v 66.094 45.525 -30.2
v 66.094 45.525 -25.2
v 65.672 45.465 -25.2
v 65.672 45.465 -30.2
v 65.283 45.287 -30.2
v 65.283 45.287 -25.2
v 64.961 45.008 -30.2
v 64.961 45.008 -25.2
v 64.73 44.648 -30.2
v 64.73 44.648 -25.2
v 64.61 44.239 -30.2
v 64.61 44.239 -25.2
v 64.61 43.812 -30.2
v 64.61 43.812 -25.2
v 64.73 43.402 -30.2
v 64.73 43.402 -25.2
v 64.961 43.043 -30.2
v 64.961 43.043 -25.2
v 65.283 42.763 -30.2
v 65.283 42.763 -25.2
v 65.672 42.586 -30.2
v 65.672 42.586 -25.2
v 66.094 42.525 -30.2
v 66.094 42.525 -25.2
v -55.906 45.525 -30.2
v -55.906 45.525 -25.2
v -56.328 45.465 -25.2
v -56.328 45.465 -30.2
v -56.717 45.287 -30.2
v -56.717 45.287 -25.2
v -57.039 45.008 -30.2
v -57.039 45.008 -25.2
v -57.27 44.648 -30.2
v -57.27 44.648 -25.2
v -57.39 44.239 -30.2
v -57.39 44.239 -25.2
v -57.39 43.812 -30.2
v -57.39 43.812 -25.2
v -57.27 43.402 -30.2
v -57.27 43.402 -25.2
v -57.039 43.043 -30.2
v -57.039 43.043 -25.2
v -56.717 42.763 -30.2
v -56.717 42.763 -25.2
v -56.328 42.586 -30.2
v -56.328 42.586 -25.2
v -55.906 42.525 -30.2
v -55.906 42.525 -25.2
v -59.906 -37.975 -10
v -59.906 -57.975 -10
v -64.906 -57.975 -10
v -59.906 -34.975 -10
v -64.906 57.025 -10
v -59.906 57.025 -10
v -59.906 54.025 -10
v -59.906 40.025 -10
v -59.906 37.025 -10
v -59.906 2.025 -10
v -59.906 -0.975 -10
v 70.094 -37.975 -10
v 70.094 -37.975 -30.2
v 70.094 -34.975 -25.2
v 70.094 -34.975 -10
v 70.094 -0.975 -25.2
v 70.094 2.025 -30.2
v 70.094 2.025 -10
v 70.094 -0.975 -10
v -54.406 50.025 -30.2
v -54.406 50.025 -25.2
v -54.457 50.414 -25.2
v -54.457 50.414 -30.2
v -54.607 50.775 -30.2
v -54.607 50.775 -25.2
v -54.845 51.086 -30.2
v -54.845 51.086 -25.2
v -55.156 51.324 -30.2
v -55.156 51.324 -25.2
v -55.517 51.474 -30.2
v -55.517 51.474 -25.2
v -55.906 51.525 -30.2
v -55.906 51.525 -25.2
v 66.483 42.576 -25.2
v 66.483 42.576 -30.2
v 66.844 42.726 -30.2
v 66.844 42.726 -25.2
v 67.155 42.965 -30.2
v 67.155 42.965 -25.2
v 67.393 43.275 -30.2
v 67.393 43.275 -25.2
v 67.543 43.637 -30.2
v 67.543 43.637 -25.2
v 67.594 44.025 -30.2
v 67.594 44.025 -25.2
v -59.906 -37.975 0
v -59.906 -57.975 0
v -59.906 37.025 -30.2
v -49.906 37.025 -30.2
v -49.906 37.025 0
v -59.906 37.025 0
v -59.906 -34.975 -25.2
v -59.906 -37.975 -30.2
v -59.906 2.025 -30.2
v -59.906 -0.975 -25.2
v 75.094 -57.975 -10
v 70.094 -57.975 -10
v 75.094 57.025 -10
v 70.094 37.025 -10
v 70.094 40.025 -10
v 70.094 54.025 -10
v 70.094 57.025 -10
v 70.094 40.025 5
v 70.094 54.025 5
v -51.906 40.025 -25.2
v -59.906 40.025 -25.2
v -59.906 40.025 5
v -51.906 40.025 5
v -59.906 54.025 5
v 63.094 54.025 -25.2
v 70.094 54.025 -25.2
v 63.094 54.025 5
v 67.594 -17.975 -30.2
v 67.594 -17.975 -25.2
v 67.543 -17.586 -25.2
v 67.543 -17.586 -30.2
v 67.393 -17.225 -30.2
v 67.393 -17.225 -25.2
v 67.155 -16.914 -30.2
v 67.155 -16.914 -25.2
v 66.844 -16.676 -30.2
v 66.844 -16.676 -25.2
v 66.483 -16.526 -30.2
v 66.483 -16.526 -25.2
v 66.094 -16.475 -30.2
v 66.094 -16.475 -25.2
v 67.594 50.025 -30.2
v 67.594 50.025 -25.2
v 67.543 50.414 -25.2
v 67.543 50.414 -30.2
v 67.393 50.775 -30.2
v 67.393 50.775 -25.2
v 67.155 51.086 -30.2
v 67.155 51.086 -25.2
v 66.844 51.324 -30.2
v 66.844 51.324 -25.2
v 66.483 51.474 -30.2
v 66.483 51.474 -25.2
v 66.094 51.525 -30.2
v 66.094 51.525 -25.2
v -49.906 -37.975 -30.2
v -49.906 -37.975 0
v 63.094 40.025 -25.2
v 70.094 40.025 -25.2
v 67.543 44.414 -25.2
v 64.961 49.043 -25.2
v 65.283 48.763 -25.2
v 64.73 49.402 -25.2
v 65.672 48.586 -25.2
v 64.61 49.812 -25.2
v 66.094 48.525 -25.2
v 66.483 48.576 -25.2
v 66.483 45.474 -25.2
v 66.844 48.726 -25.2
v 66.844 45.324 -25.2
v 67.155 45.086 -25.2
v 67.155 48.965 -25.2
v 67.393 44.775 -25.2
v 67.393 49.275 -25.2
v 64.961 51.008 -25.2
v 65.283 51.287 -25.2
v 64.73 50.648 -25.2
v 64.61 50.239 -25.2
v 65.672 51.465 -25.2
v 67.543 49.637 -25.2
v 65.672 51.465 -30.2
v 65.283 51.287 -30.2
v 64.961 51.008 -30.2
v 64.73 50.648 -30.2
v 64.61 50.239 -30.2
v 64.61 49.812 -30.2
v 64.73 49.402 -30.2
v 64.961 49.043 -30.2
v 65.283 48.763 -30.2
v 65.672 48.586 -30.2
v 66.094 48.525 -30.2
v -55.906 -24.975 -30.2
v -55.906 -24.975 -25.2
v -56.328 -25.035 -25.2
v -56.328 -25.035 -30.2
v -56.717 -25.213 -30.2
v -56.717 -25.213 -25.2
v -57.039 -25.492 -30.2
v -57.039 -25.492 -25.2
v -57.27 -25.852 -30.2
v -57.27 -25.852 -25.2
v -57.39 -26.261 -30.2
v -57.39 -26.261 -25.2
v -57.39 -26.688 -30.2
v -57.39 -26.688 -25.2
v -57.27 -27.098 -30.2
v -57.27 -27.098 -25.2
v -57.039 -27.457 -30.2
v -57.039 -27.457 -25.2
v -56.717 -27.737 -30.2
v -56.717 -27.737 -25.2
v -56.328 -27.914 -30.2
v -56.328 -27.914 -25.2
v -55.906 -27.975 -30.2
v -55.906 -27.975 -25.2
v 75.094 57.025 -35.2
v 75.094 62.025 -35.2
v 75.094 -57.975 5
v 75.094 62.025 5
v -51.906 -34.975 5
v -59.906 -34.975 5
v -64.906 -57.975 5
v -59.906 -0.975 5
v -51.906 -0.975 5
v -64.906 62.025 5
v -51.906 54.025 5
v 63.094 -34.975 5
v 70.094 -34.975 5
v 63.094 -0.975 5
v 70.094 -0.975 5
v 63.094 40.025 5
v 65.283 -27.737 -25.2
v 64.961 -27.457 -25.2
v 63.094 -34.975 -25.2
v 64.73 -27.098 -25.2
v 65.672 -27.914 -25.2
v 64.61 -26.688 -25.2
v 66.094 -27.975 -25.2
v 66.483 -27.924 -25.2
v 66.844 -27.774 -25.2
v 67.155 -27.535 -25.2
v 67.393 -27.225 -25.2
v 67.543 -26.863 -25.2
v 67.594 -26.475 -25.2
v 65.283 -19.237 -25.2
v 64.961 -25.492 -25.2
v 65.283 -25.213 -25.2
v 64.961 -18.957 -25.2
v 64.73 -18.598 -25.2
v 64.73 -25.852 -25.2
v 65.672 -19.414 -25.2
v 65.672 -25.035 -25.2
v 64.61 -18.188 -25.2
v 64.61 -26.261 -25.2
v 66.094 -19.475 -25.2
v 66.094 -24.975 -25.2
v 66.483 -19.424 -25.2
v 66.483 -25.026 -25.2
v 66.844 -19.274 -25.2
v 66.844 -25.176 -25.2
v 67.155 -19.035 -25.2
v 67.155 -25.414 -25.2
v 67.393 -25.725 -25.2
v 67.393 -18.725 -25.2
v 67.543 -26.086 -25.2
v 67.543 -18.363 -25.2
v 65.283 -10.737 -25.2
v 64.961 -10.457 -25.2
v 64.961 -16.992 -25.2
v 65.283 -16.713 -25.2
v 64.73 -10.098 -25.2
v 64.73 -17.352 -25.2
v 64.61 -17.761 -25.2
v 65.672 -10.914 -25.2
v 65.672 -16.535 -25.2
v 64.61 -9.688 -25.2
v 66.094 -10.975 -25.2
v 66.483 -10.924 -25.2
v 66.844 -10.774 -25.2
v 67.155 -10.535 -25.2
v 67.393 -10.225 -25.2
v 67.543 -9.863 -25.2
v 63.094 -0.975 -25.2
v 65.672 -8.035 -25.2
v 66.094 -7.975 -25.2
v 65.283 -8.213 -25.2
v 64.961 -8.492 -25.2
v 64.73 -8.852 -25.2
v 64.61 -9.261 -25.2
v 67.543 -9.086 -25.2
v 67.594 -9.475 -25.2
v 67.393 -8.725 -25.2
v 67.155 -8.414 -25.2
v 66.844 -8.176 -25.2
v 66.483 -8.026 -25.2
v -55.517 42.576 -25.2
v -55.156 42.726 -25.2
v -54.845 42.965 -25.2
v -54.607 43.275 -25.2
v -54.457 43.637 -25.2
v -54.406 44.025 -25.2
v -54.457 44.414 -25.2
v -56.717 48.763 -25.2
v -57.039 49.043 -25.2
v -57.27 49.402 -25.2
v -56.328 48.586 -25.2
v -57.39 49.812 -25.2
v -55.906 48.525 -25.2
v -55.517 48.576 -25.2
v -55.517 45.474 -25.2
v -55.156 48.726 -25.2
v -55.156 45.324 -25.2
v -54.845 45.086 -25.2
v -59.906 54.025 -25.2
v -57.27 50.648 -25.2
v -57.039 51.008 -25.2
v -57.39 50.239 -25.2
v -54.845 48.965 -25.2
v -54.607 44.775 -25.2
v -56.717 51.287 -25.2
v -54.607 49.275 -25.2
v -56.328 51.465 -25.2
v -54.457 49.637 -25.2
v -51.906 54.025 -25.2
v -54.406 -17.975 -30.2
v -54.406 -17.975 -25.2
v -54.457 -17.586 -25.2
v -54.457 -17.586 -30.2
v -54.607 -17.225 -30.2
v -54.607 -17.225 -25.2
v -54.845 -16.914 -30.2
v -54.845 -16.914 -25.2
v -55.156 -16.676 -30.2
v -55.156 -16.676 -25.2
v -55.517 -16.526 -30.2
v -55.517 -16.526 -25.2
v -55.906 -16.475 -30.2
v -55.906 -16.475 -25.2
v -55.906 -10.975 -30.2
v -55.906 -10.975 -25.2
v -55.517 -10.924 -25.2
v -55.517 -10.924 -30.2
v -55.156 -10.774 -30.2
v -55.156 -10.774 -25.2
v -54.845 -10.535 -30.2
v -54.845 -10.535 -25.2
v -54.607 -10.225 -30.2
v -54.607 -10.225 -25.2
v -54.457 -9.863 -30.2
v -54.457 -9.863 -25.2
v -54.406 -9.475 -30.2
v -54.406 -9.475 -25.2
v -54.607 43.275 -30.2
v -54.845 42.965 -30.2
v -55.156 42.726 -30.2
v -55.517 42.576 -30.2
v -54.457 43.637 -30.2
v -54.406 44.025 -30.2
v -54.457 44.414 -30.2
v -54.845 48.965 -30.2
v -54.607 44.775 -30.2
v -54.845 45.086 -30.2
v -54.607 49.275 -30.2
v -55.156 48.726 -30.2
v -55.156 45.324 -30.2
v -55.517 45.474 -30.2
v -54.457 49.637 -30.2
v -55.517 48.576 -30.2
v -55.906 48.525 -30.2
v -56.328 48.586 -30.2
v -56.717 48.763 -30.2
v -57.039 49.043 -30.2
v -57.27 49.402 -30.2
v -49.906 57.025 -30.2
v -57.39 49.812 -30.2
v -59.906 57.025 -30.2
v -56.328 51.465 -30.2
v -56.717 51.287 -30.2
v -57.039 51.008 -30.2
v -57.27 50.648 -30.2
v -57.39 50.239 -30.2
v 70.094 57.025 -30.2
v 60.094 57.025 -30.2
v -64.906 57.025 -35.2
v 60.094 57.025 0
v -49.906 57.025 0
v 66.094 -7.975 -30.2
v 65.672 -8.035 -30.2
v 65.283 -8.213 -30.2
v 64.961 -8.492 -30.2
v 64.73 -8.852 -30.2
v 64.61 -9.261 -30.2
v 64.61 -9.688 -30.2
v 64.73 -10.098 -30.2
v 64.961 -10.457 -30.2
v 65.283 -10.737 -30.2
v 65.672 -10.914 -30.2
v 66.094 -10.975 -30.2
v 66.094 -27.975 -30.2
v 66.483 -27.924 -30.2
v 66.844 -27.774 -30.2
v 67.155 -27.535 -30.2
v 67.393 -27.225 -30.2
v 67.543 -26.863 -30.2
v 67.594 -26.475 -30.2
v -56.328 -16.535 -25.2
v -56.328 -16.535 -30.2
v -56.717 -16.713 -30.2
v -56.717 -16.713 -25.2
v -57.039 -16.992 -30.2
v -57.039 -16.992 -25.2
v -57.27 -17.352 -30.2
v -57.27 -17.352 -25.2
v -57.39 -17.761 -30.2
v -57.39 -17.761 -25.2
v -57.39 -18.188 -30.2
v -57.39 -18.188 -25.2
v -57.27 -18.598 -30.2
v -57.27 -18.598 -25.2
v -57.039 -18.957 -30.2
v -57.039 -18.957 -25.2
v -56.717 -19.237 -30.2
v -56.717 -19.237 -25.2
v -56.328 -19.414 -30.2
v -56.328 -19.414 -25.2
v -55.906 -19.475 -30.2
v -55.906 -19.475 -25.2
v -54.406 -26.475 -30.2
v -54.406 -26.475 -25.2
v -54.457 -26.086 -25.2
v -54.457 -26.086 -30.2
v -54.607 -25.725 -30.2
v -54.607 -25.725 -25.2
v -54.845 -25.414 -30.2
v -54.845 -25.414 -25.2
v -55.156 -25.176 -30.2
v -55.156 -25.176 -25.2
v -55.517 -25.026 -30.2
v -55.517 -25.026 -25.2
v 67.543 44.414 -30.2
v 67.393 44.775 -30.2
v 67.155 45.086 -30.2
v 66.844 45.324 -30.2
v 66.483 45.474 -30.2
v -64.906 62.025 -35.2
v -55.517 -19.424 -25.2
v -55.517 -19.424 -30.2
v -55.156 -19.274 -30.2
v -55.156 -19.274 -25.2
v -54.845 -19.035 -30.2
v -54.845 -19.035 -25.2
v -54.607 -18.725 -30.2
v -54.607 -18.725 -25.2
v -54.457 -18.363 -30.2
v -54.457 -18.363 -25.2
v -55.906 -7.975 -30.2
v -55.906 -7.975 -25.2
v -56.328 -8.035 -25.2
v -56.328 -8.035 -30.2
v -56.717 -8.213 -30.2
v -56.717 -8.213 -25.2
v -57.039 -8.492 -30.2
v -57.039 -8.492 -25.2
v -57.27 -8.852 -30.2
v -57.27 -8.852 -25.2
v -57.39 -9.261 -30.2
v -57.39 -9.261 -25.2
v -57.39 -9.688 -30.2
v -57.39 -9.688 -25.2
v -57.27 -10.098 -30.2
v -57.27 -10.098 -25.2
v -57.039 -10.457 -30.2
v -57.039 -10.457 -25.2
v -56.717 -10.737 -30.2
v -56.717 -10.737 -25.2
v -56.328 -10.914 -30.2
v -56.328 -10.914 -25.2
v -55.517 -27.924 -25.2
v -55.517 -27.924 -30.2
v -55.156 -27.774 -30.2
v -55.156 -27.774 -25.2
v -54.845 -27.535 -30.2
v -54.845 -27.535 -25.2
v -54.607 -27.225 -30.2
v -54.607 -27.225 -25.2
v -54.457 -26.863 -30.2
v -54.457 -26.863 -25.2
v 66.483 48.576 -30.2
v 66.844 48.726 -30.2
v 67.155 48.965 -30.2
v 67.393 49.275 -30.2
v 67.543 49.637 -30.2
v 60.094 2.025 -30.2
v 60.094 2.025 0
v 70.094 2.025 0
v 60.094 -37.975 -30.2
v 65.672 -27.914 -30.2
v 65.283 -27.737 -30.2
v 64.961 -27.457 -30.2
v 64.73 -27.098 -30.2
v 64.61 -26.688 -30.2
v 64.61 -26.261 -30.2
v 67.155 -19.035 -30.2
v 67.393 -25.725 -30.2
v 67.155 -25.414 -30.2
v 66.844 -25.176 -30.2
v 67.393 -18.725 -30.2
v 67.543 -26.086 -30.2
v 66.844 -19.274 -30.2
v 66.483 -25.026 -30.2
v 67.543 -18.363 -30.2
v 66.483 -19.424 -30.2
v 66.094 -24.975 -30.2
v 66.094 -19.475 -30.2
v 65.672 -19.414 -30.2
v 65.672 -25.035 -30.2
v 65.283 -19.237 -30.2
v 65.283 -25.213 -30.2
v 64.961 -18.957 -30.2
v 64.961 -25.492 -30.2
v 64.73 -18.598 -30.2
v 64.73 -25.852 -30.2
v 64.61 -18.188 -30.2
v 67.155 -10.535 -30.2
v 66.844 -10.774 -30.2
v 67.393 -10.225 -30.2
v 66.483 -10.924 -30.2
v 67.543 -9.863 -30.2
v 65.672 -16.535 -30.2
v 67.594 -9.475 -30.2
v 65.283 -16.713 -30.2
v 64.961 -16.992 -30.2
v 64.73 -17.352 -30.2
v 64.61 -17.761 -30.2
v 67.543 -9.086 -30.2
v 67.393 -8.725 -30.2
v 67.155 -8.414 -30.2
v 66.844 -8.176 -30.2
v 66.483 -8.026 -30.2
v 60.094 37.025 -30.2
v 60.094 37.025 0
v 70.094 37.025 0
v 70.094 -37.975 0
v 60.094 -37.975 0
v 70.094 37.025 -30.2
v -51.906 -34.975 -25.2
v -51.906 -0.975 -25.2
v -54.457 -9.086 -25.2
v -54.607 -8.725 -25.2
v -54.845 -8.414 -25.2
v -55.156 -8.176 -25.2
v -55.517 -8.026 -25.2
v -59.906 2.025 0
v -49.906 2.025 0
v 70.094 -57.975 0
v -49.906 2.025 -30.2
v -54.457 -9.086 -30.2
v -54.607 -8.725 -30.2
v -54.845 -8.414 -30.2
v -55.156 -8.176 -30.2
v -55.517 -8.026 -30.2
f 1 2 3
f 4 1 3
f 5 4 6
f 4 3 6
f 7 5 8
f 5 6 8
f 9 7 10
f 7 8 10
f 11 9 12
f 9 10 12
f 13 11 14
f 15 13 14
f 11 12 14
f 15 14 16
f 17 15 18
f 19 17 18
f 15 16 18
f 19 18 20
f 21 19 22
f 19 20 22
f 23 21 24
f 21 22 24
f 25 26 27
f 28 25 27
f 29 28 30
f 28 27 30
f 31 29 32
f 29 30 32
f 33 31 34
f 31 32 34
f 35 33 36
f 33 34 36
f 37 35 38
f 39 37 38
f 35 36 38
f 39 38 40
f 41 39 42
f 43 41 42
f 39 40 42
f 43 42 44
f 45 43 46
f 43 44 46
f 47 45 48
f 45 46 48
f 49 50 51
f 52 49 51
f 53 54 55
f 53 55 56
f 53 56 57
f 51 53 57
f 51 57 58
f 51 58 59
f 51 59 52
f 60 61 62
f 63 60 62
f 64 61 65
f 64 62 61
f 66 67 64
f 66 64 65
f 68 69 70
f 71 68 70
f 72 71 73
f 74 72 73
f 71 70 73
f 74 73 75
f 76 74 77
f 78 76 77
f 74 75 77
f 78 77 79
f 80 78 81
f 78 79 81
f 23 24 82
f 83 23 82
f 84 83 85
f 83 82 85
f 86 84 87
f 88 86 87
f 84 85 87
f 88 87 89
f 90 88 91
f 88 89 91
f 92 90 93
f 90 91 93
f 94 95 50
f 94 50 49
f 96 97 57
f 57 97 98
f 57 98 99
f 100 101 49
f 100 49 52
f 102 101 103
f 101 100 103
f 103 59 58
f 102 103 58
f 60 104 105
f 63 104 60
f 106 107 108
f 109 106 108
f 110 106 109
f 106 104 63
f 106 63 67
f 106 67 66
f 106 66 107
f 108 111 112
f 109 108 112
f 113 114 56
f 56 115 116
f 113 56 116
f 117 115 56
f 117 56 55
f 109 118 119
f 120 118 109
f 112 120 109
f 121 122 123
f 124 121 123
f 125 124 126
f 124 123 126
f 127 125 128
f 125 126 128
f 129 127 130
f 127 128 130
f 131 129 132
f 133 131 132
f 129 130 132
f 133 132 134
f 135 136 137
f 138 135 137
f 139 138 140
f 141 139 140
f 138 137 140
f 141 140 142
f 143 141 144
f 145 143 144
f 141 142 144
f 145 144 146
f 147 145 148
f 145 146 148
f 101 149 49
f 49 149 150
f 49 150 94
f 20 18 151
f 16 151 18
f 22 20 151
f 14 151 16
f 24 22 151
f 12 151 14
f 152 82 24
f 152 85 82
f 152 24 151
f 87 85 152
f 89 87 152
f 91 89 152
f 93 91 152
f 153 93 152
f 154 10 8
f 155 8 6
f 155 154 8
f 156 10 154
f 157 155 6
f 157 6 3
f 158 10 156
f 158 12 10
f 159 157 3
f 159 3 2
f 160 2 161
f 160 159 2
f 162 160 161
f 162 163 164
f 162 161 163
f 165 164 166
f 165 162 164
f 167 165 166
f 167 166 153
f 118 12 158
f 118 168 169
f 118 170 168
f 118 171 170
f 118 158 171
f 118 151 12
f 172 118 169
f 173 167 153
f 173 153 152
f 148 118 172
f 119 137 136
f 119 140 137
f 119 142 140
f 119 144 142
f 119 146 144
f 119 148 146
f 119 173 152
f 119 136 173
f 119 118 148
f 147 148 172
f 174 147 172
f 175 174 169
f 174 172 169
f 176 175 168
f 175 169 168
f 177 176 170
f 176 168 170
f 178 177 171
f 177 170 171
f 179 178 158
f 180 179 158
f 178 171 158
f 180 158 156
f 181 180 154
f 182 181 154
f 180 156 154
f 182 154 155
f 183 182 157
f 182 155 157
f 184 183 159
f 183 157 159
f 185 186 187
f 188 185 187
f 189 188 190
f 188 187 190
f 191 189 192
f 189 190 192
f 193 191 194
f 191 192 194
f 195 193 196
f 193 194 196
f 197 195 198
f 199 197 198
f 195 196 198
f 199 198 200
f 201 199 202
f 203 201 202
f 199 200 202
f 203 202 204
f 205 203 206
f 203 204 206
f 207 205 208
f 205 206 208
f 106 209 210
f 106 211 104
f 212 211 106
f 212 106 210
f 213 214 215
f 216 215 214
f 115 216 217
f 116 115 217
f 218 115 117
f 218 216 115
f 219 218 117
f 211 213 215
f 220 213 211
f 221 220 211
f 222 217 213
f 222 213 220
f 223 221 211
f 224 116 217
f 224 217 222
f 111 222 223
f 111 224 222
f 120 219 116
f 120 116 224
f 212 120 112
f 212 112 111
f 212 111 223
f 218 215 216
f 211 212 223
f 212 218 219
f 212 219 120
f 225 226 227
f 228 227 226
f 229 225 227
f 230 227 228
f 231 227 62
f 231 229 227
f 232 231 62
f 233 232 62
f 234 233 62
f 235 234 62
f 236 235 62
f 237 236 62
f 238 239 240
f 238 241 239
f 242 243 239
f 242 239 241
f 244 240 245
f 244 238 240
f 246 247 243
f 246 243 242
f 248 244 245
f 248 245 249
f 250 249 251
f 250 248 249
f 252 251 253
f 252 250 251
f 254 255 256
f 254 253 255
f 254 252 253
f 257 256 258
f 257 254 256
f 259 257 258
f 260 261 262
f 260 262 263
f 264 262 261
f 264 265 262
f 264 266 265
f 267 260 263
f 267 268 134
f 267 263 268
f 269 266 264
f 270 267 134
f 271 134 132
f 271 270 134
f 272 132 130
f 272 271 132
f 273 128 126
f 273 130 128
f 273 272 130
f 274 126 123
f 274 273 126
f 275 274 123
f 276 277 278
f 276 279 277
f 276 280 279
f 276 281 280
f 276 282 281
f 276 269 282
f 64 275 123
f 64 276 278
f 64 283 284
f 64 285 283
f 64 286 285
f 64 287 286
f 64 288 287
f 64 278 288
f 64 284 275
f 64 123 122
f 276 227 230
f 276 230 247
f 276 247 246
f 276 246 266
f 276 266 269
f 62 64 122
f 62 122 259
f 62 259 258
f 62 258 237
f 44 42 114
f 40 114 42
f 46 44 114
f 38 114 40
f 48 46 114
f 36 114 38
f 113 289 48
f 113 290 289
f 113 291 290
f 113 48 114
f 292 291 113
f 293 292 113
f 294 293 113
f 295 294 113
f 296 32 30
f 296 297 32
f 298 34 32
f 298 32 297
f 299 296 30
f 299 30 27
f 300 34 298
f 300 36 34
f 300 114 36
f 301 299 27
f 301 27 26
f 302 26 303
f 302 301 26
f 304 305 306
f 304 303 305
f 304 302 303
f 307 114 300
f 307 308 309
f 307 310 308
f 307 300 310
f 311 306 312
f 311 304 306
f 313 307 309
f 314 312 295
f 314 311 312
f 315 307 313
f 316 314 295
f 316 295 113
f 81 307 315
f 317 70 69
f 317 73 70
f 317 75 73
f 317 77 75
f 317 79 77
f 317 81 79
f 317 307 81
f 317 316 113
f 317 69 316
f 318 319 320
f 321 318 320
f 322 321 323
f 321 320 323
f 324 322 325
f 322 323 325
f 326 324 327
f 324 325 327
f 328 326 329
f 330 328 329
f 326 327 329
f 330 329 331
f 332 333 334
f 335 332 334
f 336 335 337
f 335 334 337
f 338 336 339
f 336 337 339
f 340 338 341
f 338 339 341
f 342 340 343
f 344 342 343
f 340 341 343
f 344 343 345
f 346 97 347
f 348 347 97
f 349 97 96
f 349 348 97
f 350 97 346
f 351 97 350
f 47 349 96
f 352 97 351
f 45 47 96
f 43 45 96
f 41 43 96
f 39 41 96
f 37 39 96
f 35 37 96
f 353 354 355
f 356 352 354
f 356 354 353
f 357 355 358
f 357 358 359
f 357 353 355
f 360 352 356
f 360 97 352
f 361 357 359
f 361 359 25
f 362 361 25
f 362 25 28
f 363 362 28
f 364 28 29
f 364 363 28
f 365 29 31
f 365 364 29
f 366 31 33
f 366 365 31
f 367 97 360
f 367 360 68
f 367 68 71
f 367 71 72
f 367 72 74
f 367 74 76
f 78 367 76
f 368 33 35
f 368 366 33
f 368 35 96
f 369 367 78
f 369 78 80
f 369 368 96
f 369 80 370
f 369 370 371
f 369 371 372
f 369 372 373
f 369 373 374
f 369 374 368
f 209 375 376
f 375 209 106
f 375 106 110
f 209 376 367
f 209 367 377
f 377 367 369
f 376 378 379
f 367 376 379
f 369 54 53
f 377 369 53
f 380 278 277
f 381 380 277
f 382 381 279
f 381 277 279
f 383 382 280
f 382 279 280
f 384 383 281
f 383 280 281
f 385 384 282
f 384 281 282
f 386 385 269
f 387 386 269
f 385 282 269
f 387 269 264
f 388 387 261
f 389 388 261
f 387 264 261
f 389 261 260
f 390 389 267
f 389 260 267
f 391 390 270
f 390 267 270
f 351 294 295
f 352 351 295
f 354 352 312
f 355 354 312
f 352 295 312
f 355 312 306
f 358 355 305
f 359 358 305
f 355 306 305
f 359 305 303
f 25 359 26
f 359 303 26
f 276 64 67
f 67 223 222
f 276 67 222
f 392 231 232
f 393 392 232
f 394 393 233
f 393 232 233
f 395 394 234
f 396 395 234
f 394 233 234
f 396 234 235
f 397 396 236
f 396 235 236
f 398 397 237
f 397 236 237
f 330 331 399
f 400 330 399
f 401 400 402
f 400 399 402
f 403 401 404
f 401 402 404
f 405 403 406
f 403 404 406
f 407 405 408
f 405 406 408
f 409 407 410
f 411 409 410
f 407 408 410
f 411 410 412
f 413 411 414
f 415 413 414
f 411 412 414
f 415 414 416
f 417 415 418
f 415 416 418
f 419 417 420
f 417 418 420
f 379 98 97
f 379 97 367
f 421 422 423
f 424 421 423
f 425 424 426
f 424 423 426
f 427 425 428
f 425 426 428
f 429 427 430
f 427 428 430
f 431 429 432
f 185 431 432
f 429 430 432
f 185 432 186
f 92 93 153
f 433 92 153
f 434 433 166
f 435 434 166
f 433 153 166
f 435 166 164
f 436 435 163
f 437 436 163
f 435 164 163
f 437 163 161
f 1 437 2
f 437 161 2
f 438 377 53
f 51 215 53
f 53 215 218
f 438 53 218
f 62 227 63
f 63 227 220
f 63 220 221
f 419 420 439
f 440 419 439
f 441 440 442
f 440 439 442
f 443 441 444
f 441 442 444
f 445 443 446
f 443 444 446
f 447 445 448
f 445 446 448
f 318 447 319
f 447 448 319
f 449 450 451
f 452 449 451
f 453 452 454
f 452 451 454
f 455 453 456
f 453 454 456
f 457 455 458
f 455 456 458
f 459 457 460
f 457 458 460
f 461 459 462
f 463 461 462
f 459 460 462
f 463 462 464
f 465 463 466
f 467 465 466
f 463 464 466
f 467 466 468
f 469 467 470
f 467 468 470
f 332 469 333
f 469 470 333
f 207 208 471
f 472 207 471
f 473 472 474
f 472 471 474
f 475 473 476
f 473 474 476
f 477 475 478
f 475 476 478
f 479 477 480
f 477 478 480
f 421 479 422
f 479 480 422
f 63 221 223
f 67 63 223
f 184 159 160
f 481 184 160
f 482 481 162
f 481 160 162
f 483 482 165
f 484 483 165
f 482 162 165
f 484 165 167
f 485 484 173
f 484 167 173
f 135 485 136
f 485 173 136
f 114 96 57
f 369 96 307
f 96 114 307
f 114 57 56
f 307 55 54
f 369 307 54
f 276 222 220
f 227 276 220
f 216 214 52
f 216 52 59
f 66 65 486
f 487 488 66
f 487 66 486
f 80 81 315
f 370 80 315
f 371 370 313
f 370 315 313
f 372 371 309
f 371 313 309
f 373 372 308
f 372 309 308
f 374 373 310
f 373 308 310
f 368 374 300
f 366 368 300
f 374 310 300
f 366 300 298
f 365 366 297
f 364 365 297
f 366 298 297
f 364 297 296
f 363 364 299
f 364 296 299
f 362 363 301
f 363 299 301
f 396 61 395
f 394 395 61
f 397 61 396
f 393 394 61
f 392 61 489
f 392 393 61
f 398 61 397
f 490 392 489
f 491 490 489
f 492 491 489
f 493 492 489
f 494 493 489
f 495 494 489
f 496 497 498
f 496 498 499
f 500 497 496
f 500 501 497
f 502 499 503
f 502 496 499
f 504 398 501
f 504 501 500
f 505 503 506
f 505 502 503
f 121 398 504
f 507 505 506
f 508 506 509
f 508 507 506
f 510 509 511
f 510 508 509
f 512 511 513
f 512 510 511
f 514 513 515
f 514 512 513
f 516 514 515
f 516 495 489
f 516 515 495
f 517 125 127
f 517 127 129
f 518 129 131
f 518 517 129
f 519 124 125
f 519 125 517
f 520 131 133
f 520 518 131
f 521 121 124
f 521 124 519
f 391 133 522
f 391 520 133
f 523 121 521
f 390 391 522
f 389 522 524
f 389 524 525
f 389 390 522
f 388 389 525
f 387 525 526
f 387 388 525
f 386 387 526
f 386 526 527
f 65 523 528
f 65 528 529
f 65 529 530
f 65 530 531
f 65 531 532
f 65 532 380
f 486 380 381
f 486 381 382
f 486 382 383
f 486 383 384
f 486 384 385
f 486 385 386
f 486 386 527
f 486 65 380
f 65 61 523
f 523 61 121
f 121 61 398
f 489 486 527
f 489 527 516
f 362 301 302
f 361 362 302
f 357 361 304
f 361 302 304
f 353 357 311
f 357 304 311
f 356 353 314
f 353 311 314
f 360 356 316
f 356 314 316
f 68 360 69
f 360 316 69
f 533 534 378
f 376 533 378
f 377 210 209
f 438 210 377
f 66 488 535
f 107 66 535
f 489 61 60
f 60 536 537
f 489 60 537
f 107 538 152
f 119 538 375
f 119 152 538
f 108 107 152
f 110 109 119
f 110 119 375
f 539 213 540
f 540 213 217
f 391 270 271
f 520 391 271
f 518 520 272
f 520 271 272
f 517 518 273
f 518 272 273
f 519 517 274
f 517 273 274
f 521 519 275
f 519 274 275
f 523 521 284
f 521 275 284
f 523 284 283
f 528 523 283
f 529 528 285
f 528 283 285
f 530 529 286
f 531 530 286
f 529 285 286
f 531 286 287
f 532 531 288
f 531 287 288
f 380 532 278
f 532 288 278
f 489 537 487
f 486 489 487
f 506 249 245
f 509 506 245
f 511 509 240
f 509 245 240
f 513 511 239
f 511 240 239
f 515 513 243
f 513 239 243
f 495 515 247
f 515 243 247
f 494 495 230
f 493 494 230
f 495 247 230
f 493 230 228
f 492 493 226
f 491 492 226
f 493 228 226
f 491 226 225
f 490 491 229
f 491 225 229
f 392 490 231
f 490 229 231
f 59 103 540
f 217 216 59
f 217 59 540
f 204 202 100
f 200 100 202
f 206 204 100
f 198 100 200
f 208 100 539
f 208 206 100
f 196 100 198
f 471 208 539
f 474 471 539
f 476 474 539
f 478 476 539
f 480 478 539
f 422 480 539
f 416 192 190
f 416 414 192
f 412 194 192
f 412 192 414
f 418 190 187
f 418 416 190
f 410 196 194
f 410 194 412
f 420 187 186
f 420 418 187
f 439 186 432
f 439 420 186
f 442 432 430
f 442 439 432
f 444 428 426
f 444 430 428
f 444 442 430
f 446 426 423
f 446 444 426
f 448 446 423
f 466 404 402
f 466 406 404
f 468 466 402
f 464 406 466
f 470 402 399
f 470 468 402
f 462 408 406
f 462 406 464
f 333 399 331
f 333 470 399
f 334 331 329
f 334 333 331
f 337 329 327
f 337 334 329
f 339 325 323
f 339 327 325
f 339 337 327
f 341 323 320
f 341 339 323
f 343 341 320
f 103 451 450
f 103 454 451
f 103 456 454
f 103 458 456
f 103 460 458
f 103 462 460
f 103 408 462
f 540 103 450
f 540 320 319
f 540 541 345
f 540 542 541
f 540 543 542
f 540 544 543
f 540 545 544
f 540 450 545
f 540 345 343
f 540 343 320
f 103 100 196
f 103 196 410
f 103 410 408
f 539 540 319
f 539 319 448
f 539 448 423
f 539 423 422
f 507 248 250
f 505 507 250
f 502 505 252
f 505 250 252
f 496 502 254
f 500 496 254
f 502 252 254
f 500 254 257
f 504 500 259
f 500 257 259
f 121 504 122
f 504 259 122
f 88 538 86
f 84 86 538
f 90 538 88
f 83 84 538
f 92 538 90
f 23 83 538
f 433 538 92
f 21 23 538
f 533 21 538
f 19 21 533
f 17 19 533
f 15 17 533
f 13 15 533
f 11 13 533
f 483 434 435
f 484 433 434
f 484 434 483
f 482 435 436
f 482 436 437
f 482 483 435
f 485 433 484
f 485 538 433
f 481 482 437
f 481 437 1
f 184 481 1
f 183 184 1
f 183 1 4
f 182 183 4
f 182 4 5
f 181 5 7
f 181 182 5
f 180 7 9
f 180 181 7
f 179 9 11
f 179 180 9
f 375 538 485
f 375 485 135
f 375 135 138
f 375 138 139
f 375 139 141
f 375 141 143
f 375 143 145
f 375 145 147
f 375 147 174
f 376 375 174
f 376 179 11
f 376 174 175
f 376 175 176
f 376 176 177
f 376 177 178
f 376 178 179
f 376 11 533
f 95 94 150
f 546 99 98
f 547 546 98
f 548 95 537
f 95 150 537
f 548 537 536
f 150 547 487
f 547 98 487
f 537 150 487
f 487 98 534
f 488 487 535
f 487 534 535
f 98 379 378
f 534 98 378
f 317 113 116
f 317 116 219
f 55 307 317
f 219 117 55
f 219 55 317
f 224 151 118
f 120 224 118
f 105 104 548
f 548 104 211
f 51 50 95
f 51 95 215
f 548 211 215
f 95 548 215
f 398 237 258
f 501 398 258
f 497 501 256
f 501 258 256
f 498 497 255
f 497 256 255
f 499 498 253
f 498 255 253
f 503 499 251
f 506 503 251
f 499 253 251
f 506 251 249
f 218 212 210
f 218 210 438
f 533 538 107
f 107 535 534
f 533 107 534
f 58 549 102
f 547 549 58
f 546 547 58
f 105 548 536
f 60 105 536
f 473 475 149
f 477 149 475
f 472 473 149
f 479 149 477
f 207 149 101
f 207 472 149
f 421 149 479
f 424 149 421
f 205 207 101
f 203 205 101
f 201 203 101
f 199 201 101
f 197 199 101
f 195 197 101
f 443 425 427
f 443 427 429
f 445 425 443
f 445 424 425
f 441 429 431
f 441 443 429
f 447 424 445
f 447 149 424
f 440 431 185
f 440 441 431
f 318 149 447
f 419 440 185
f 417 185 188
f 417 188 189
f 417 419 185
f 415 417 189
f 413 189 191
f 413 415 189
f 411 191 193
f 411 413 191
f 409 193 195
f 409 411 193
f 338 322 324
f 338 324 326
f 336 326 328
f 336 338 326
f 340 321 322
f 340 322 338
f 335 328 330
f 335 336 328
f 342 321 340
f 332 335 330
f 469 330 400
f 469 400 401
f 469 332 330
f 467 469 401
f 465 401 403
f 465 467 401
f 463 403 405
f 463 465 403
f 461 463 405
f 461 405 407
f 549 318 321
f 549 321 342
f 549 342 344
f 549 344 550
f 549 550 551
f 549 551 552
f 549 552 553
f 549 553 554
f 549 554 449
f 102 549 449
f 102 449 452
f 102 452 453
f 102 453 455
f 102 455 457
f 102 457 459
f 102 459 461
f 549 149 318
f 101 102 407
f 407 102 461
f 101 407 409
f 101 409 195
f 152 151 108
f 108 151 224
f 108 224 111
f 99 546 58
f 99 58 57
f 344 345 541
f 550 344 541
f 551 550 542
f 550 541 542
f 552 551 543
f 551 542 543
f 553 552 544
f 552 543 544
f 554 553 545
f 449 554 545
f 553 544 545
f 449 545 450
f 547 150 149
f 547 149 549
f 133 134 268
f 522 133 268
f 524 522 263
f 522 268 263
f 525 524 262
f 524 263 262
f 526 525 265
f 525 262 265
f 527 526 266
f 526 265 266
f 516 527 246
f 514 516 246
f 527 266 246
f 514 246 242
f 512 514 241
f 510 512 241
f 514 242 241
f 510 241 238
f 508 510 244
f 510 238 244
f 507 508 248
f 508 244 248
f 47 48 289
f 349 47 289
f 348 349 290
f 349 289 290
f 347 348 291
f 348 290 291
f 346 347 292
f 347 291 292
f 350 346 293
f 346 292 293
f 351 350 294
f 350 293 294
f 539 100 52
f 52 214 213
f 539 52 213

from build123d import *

# Parameters (mm, degrees)
SKETCH_1_W          = 140
SKETCH_1_H          = 120
EXTRUDE_1_DEPTH     = 5
SKETCH_2_W          = 140
SKETCH_2_H          = 5
EXTRUDE_2_DEPTH     = 35.2
SKETCH_5_W          = 10
SKETCH_5_H          = 40
SKETCH_5_H_2        = 20
EXTRUDE_3_DEPTH     = 30.2
SKETCH_6_W          = 8
SKETCH_6_H          = 14
SKETCH_6_H_2        = 34
SKETCH_6_W_2        = 7
CUT_EXTRUDE_1_DEPTH = 30.2
CUT_EXTRUDE_2_DEPTH = 102.972271659
SKETCH_11_W         = 5
SKETCH_11_H         = 115
EXTRUDE_4_DEPTH     = 10


with BuildPart() as part:
    # 스케치1 → 보스-돌출1 (new body)
    with BuildSketch(Plane.XY):
        with Locations((5.094369335, 2.025316456)):
            Rectangle(SKETCH_1_W, SKETCH_1_H)
    extrude(amount=EXTRUDE_1_DEPTH)

    # 스케치2 → 보스-돌출2 (add)
    with BuildSketch(Plane(origin=(0, 0, 0), x_dir=(-1, 0, 0), z_dir=(0, 0, -1))):
        with Locations((-5.094369335, 59.525316456)):
            Rectangle(SKETCH_2_W, SKETCH_2_H)
    extrude(amount=EXTRUDE_2_DEPTH)

    # 스케치5 → 보스-돌출3 (add)
    with BuildSketch(Plane(origin=(0, 0, 0), x_dir=(-1, 0, 0), z_dir=(0, 0, -1))):
        with Locations((-65.094369335, -17.974683544)):
            Rectangle(SKETCH_5_W, SKETCH_5_H)
        with Locations((-65.094369335, 47.025316456)):
            Rectangle(SKETCH_5_W, SKETCH_5_H_2)
        with Locations((54.905630665, -17.974683544)):
            Rectangle(SKETCH_5_W, SKETCH_5_H)
        with Locations((54.905630665, 47.025316456)):
            Rectangle(SKETCH_5_W, SKETCH_5_H_2)
    extrude(amount=EXTRUDE_3_DEPTH)

    # 스케치6 → 컷-돌출1 (cut)
    with BuildSketch(Plane.XY.offset(5)):
        with Locations((-55.905630665, 47.025316456)):
            Rectangle(SKETCH_6_W, SKETCH_6_H)
        with Locations((-55.905630665, -17.974683544)):
            Rectangle(SKETCH_6_W, SKETCH_6_H_2)
        Polygon((63.622466752, -0.974683544), (63.094369335, -0.974683544), (63.094369335, -34.974683544), (70.094369335, -34.974683544), (70.094369335, -0.974683544), align=None)
        with Locations((66.594369335, 47.025316456)):
            Rectangle(SKETCH_6_W_2, SKETCH_6_H)
    extrude(amount=-CUT_EXTRUDE_1_DEPTH, mode=Mode.SUBTRACT)

    # 스케치8 → 컷-돌출2 (cut, through all)
    with BuildSketch(Plane.XY.offset(-25.2)):
        with BuildLine():
            ThreePointArc((-54.405630665, 44.025316456), (-54.844970493, 45.085976627), (-55.905630665, 45.525316456))
            Line((-55.905630665, 45.525316456), (-55.905630665, 42.525316456))
            ThreePointArc((-55.905630665, 42.525316456), (-54.844970493, 42.964656284), (-54.405630665, 44.025316456))
        make_face()
        with BuildLine():
            Line((-55.905630665, 42.525316456), (-55.905630665, 45.525316456))
            ThreePointArc((-55.905630665, 45.525316456), (-57.405630665, 44.025316456), (-55.905630665, 42.525316456))
        make_face()
        with BuildLine():
            ThreePointArc((-54.405630665, 50.025316456), (-54.844970493, 51.085976627), (-55.905630665, 51.525316456))
            Line((-55.905630665, 51.525316456), (-55.905630665, 48.525316456))
            ThreePointArc((-55.905630665, 48.525316456), (-54.844970493, 48.964656284), (-54.405630665, 50.025316456))
        make_face()
        with BuildLine():
            Line((-55.905630665, 48.525316456), (-55.905630665, 51.525316456))
            ThreePointArc((-55.905630665, 51.525316456), (-57.405630665, 50.025316456), (-55.905630665, 48.525316456))
        make_face()
        with BuildLine():
            ThreePointArc((-54.405630665, -9.474683544), (-54.844970493, -8.414023373), (-55.905630665, -7.974683544))
            Line((-55.905630665, -7.974683544), (-55.905630665, -10.974683544))
            ThreePointArc((-55.905630665, -10.974683544), (-54.844970493, -10.535343716), (-54.405630665, -9.474683544))
        make_face()
        with BuildLine():
            Line((-55.905630665, -10.974683544), (-55.905630665, -7.974683544))
            ThreePointArc((-55.905630665, -7.974683544), (-57.405630665, -9.474683544), (-55.905630665, -10.974683544))
        make_face()
        with BuildLine():
            ThreePointArc((-54.405630665, -17.974683544), (-54.844970493, -16.914023373), (-55.905630665, -16.474683544))
            Line((-55.905630665, -16.474683544), (-55.905630665, -19.474683544))
            ThreePointArc((-55.905630665, -19.474683544), (-54.844970493, -19.035343716), (-54.405630665, -17.974683544))
        make_face()
        with BuildLine():
            Line((-55.905630665, -19.474683544), (-55.905630665, -16.474683544))
            ThreePointArc((-55.905630665, -16.474683544), (-57.405630665, -17.974683544), (-55.905630665, -19.474683544))
        make_face()
        with BuildLine():
            ThreePointArc((-54.405630665, -26.474683544), (-54.844970493, -25.414023373), (-55.905630665, -24.974683544))
            Line((-55.905630665, -24.974683544), (-55.905630665, -27.974683544))
            ThreePointArc((-55.905630665, -27.974683544), (-54.844970493, -27.535343716), (-54.405630665, -26.474683544))
        make_face()
        with BuildLine():
            Line((-55.905630665, -27.974683544), (-55.905630665, -24.974683544))
            ThreePointArc((-55.905630665, -24.974683544), (-57.405630665, -26.474683544), (-55.905630665, -27.974683544))
        make_face()
        with BuildLine():
            ThreePointArc((67.594369335, -26.474683544), (67.155029507, -25.414023373), (66.094369335, -24.974683544))
            Line((66.094369335, -24.974683544), (66.094369335, -27.974683544))
            ThreePointArc((66.094369335, -27.974683544), (67.155029507, -27.535343716), (67.594369335, -26.474683544))
        make_face()
        with BuildLine():
            Line((66.094369335, -27.974683544), (66.094369335, -24.974683544))
            ThreePointArc((66.094369335, -24.974683544), (64.594369335, -26.474683544), (66.094369335, -27.974683544))
        make_face()
        with BuildLine():
            ThreePointArc((67.594369335, -17.974683544), (67.155029507, -16.914023373), (66.094369335, -16.474683544))
            Line((66.094369335, -16.474683544), (66.094369335, -19.474683544))
            ThreePointArc((66.094369335, -19.474683544), (67.155029507, -19.035343716), (67.594369335, -17.974683544))
        make_face()
        with BuildLine():
            Line((66.094369335, -19.474683544), (66.094369335, -16.474683544))
            ThreePointArc((66.094369335, -16.474683544), (64.594369335, -17.974683544), (66.094369335, -19.474683544))
        make_face()
        with BuildLine():
            ThreePointArc((67.594369335, -9.474683544), (67.155029507, -8.414023373), (66.094369335, -7.974683544))
            Line((66.094369335, -7.974683544), (66.094369335, -10.974683544))
            ThreePointArc((66.094369335, -10.974683544), (67.155029507, -10.535343716), (67.594369335, -9.474683544))
        make_face()
        with BuildLine():
            Line((66.094369335, -10.974683544), (66.094369335, -7.974683544))
            ThreePointArc((66.094369335, -7.974683544), (64.594369335, -9.474683544), (66.094369335, -10.974683544))
        make_face()
        with BuildLine():
            ThreePointArc((67.594369335, 44.025316456), (67.155029507, 45.085976627), (66.094369335, 45.525316456))
            Line((66.094369335, 45.525316456), (66.094369335, 42.525316456))
            ThreePointArc((66.094369335, 42.525316456), (67.155029507, 42.964656284), (67.594369335, 44.025316456))
        make_face()
        with BuildLine():
            Line((66.094369335, 42.525316456), (66.094369335, 45.525316456))
            ThreePointArc((66.094369335, 45.525316456), (64.594369335, 44.025316456), (66.094369335, 42.525316456))
        make_face()
        with BuildLine():
            ThreePointArc((67.594369335, 50.025316456), (67.155029507, 51.085976627), (66.094369335, 51.525316456))
            Line((66.094369335, 51.525316456), (66.094369335, 48.525316456))
            ThreePointArc((66.094369335, 48.525316456), (67.155029507, 48.964656284), (67.594369335, 50.025316456))
        make_face()
        with BuildLine():
            Line((66.094369335, 48.525316456), (66.094369335, 51.525316456))
            ThreePointArc((66.094369335, 51.525316456), (64.594369335, 50.025316456), (66.094369335, 48.525316456))
        make_face()
    extrude(amount=-CUT_EXTRUDE_2_DEPTH, mode=Mode.SUBTRACT)

    # 스케치11 → 보스-돌출4 (add)
    with BuildSketch(Plane(origin=(0, 0, 0), x_dir=(-1, 0, 0), z_dir=(0, 0, -1))):
        with Locations((62.405630665, -0.474683544)):
            Rectangle(SKETCH_11_W, SKETCH_11_H)
        with Locations((-72.594369335, -0.474683544)):
            Rectangle(SKETCH_11_W, SKETCH_11_H)
    extrude(amount=EXTRUDE_4_DEPTH)


solid = part.part
